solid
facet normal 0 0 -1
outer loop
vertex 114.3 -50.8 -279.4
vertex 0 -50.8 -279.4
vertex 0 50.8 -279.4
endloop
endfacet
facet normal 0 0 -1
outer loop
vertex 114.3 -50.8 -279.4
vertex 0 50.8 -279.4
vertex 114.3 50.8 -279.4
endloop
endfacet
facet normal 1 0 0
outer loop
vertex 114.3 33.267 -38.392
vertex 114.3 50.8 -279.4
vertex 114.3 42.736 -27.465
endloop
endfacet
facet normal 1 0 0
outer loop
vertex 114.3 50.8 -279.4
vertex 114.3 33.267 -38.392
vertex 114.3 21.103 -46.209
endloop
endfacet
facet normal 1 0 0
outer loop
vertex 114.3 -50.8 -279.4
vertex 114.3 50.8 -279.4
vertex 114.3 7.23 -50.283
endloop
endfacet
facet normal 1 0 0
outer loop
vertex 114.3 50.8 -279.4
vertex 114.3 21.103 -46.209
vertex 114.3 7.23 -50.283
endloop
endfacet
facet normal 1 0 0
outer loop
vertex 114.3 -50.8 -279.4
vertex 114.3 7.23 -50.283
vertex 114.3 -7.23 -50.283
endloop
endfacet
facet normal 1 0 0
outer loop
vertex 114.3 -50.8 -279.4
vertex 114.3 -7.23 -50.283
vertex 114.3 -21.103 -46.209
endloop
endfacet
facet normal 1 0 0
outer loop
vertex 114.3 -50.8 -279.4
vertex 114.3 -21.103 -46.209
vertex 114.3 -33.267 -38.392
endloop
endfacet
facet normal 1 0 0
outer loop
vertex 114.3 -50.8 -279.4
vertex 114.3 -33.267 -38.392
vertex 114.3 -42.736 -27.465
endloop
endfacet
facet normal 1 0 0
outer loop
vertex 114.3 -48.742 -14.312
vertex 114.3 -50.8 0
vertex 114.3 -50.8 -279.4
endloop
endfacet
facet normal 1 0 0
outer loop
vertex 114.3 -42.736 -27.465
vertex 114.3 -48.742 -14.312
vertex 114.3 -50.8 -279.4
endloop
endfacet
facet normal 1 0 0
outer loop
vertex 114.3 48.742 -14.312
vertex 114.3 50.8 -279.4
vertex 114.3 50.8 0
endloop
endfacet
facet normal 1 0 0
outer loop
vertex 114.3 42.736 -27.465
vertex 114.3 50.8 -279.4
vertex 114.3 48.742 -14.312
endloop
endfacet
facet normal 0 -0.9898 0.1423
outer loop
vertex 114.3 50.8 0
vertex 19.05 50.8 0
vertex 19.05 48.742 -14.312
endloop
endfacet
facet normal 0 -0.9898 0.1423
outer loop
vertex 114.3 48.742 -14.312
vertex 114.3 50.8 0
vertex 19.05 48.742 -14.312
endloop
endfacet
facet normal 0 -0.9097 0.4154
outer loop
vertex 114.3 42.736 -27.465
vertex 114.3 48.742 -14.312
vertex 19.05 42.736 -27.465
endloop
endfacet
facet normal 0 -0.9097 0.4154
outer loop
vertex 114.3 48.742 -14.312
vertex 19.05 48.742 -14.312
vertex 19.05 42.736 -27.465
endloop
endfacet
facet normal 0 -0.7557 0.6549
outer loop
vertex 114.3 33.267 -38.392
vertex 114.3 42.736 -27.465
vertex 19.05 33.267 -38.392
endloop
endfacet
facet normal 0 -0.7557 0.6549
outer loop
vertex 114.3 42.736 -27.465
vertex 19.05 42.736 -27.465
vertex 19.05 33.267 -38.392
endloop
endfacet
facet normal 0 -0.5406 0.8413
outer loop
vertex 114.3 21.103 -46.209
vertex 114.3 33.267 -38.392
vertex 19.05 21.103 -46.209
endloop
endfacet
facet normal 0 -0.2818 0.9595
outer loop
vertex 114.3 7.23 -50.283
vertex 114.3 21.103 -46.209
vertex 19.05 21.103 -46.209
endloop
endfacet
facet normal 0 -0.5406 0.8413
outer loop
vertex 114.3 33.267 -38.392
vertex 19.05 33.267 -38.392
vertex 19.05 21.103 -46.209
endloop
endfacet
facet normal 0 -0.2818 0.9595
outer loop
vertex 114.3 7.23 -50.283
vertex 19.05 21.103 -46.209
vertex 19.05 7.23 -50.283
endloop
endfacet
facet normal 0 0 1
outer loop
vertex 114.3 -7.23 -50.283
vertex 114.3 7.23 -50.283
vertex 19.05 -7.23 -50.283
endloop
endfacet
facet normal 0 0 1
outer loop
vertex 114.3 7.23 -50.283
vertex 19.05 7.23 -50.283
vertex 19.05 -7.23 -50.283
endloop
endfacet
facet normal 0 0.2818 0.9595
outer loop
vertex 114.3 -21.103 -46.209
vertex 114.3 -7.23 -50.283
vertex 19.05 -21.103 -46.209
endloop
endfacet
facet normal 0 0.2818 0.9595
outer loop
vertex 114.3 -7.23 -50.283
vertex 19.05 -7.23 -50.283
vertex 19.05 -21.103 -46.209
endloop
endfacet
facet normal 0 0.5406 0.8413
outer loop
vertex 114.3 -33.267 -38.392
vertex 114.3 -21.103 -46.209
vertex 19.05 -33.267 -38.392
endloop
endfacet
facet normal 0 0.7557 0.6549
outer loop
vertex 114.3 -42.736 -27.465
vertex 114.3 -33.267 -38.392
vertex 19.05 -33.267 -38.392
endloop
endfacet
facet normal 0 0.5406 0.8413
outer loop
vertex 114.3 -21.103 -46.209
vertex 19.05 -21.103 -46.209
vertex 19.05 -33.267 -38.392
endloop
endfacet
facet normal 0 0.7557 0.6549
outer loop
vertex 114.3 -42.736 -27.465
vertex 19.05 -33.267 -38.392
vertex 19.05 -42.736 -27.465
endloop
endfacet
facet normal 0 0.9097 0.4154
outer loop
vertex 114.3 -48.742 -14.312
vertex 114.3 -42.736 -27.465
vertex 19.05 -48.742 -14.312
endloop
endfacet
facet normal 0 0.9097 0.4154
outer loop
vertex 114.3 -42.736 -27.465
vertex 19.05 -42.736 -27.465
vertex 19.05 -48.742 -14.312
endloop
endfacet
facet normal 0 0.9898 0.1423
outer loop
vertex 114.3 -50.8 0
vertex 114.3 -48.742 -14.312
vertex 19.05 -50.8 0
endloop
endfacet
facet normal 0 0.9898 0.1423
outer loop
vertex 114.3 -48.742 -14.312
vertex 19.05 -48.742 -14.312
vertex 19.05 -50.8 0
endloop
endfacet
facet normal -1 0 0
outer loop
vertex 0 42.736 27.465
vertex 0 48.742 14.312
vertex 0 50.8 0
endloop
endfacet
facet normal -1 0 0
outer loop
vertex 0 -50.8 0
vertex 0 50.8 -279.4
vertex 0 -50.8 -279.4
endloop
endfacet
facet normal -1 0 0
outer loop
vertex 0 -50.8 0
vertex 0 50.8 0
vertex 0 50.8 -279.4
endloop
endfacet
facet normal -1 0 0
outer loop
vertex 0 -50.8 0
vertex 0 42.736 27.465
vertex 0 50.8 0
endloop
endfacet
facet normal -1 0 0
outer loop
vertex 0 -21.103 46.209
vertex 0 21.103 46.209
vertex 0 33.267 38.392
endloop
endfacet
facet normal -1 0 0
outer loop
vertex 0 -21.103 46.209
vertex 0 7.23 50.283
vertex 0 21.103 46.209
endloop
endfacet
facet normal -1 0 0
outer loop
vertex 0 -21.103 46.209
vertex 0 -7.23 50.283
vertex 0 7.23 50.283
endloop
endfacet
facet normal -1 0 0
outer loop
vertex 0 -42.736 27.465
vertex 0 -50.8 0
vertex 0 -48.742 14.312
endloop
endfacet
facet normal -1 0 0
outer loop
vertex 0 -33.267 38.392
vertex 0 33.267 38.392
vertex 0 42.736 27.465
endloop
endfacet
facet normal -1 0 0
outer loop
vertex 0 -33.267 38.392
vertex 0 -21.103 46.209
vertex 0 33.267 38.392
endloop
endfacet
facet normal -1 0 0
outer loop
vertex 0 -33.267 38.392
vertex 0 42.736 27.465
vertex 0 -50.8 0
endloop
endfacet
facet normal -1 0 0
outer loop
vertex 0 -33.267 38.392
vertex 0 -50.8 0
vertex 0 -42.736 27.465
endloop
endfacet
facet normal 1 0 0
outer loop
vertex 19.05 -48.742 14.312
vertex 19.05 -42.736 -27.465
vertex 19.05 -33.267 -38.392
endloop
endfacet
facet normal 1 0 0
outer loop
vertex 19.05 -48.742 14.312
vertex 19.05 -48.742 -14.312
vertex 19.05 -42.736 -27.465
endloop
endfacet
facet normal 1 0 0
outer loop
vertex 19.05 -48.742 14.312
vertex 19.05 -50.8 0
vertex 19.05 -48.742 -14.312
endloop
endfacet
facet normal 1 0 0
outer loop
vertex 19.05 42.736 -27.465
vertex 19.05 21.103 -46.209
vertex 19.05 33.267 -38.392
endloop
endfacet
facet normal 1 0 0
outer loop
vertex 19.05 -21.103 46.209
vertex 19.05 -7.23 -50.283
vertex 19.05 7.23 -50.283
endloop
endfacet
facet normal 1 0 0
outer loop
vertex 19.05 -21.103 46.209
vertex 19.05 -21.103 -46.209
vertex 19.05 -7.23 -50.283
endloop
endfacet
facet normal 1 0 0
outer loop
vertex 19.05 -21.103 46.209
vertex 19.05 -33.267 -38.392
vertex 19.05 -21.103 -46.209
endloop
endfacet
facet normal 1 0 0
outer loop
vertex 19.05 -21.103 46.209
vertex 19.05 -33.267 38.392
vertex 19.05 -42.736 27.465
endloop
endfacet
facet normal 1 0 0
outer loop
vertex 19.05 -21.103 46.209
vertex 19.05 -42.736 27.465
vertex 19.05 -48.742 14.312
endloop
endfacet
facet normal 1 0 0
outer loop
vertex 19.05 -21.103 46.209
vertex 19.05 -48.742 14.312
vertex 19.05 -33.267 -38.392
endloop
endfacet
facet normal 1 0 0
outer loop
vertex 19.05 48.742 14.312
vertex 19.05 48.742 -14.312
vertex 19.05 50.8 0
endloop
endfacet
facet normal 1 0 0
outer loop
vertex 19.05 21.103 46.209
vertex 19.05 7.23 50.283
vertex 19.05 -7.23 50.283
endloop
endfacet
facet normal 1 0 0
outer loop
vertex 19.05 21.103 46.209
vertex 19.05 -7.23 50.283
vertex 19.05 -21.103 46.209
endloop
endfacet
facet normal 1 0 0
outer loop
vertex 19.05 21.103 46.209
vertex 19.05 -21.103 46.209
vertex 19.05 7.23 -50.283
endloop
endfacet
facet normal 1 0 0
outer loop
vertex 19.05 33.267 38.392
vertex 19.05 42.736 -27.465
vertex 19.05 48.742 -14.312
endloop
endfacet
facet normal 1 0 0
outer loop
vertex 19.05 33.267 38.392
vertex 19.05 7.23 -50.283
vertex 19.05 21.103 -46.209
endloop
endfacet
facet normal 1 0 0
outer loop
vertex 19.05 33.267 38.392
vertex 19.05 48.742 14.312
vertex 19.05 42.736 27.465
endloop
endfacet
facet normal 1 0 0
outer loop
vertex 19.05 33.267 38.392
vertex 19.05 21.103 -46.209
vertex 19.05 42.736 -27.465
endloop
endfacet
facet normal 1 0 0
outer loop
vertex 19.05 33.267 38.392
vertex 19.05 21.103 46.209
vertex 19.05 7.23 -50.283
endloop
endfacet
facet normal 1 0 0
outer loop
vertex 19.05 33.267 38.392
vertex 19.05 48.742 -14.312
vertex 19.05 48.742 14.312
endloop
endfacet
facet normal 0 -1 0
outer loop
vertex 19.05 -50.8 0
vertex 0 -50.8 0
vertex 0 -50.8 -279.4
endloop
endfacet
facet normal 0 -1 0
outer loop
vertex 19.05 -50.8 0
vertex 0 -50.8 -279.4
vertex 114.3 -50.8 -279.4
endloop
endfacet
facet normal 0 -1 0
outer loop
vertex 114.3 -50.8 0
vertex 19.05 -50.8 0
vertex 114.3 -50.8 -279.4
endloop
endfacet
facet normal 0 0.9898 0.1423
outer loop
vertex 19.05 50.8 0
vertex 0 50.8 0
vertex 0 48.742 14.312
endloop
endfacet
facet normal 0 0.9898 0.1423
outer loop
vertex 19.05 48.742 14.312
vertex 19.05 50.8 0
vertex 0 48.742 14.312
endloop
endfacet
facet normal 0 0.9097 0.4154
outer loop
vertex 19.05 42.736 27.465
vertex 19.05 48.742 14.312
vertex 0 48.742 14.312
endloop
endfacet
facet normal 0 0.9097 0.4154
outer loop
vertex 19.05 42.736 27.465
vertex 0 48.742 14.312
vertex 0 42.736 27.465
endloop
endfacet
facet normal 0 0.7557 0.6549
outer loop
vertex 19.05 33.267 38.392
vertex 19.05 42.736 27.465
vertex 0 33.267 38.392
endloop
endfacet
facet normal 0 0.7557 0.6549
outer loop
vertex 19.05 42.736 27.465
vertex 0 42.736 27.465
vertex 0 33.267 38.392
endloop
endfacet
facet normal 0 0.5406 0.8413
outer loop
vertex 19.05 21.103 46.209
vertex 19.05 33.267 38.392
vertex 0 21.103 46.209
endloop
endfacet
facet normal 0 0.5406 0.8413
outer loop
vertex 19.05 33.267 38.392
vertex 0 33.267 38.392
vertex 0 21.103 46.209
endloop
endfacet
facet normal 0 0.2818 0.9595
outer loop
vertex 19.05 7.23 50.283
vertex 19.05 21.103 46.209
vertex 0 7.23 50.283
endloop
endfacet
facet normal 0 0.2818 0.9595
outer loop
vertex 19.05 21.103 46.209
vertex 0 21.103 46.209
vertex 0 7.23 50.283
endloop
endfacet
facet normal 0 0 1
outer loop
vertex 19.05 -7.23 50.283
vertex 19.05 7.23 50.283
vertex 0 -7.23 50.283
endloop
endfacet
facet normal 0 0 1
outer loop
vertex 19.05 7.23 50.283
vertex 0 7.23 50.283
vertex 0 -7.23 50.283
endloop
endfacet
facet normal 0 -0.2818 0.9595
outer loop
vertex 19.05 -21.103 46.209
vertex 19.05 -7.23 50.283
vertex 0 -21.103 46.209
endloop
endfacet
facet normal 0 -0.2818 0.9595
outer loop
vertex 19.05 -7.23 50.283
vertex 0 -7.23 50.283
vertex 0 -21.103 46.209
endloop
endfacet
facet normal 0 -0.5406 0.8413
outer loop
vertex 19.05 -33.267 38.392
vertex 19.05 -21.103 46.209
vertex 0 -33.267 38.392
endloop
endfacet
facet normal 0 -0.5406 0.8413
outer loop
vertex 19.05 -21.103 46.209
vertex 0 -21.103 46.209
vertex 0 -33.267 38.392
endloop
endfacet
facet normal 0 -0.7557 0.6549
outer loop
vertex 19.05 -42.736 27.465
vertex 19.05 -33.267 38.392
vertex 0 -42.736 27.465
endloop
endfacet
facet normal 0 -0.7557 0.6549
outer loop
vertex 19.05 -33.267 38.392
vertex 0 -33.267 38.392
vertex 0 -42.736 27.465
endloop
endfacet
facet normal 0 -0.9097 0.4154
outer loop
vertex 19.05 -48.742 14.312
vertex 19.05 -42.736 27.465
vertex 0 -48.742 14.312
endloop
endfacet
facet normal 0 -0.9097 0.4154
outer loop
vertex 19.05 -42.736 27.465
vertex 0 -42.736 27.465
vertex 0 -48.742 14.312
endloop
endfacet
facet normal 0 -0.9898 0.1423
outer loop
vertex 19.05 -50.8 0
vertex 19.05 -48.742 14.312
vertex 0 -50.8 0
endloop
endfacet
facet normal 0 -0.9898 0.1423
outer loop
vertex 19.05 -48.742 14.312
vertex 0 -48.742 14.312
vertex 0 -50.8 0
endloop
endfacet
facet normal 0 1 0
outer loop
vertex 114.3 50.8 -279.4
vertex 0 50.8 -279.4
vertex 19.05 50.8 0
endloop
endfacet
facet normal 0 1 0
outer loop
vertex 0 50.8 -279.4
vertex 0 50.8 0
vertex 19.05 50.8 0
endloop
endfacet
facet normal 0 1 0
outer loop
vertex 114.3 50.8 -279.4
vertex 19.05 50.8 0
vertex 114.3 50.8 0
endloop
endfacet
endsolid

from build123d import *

# Parameters (mm, degrees)
F1_DEPTH = 19.05
F2_DEPTH = 114.3
F3_W     = 114.3
F3_H     = 101.6
F4_DEPTH = 177.8


with BuildPart() as f1:
    # F0 (on Right) → F1 (new body)
    with BuildSketch(Plane.YZ):
        with BuildLine():
            Line((-50.8, 0), (50.8, 0))
            ThreePointArc((50.8, 0), (0, 50.8), (-50.8, 0))
        make_face()
        with BuildLine():
            Line((50.8, -101.6), (50.8, 0))
            ThreePointArc((50.8, 0), (0, -50.8), (-50.8, 0))
            Line((-50.8, 0), (-50.8, -101.6))
            Line((-50.8, -101.6), (50.8, -101.6))
        make_face()
        with BuildLine():
            ThreePointArc((-50.8, 0), (0, -50.8), (50.8, 0))
            Line((50.8, 0), (-50.8, 0))
        make_face()
    extrude(amount=F1_DEPTH)

    # F0 (on Right) → F2 (join)
    with BuildSketch(Plane.YZ):
        with BuildLine():
            Line((50.8, -101.6), (50.8, 0))
            ThreePointArc((50.8, 0), (0, -50.8), (-50.8, 0))
            Line((-50.8, 0), (-50.8, -101.6))
            Line((-50.8, -101.6), (50.8, -101.6))
        make_face()
    extrude(amount=F2_DEPTH)

    # F3 (on face) → F4 (join)
    with BuildSketch(Plane(origin=(0, 0, -101.6), x_dir=(1, 0, 0), z_dir=(0, 0, -1))):
        with Locations((57.15, 0)):
            Rectangle(F3_W, F3_H)
    extrude(amount=F4_DEPTH)


solid = f1.part
